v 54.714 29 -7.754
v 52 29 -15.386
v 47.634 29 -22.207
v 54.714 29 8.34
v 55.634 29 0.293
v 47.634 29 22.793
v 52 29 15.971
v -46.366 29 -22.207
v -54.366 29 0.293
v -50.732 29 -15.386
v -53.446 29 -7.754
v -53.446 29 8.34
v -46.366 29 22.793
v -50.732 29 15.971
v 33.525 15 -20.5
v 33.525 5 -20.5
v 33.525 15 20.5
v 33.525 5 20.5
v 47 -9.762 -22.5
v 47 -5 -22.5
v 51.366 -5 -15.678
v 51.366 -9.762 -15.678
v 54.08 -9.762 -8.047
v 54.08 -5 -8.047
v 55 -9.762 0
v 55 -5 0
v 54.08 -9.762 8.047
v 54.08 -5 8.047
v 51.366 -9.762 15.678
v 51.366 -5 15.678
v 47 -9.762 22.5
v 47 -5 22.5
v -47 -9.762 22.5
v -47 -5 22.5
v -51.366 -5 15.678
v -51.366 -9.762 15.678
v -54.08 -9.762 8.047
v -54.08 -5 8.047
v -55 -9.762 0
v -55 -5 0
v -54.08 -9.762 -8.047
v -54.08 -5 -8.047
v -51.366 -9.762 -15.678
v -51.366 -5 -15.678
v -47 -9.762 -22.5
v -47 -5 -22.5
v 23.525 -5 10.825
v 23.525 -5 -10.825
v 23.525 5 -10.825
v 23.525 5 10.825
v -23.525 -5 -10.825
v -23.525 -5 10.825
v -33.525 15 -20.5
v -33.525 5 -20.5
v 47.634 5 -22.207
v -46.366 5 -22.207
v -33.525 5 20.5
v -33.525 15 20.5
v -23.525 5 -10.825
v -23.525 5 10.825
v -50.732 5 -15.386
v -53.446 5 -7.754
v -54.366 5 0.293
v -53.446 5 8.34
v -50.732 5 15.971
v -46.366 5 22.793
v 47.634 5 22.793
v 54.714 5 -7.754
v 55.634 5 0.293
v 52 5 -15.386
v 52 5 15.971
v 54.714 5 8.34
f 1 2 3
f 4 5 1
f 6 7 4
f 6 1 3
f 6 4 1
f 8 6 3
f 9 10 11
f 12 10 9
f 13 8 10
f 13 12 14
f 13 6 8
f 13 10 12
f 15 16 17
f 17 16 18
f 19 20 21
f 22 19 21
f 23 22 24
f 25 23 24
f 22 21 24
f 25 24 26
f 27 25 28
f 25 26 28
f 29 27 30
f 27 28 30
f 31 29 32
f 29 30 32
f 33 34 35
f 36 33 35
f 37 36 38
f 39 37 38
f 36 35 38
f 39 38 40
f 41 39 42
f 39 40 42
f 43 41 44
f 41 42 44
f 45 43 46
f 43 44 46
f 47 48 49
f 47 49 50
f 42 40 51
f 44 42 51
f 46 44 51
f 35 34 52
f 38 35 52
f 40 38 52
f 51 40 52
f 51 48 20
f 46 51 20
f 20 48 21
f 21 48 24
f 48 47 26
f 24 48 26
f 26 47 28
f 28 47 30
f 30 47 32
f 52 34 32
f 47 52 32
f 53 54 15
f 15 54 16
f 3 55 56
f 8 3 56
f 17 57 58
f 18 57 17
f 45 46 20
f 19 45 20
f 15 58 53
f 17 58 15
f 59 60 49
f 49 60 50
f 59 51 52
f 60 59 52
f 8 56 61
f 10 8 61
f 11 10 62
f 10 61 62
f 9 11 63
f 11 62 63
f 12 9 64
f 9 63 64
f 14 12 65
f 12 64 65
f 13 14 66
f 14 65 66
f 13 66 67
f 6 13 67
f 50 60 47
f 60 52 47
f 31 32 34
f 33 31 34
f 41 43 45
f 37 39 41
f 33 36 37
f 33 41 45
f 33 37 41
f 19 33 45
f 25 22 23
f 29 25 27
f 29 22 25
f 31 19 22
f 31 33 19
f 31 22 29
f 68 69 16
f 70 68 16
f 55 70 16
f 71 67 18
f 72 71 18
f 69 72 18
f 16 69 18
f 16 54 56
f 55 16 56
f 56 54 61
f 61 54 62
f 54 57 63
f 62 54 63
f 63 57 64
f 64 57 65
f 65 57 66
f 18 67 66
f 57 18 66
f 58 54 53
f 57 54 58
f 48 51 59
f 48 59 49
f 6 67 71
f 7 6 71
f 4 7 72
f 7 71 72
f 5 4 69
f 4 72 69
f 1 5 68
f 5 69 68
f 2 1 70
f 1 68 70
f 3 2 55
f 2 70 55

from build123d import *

# Parameters (mm, degrees)
F0_W     = 47.05
F0_H     = 21.65
F1_DEPTH = 5
F2_W     = 4.5
F2_H     = 45
F2_W_2   = 85
F3_DEPTH = 4.7625
F4_W     = 4.5
F4_H     = 45
F4_W_2   = 85
F5_DEPTH = 24
F6_W     = 67.05
F6_H     = 41
F7_DEPTH = 10


with BuildPart() as f1:
    # F0 (on Front) → F1 (new body, symmetric)
    with BuildSketch(Plane.XZ):
        Rectangle(F0_W, F0_H)
    extrude(amount=F1_DEPTH, both=True)

    # F2 (on face) → F3 (join)
    with BuildSketch(Plane.XZ.offset(5)):
        with Locations((44.75, 0)):
            Rectangle(F2_W, F2_H)
        with BuildLine():
            ThreePointArc((47, -22.5), (55, 0), (47, 22.5))
            Line((47, 22.5), (47, -22.5))
        make_face()
        Rectangle(F2_W_2, F2_H)
        with Locations((-44.75, 0)):
            Rectangle(F2_W, F2_H)
        with BuildLine():
            Line((-47, -22.5), (-47, 22.5))
            ThreePointArc((-47, 22.5), (-55, 0), (-47, -22.5))
        make_face()
    extrude(amount=F3_DEPTH)


with BuildPart() as f5:
    # F4 (on face) → F5 (new body)
    with BuildSketch(Plane(origin=(0, 5, 0), x_dir=(-1, 0, 0), z_dir=(0, 1, 0))):
        with Locations((44.1160562322, 0.2927509486)):
            Rectangle(F4_W, F4_H)
        with BuildLine():
            Line((46.3660562322, 22.7927509486), (46.3660562322, -22.2072490514))
            ThreePointArc((46.3660562322, -22.2072490514), (54.3660562322, 0.2927509486), (46.3660562322, 22.7927509486))
        make_face()
        with Locations((-0.6339437678, 0.2927509486)):
            Rectangle(F4_W_2, F4_H)
        with Locations((-45.3839437678, 0.2927509486)):
            Rectangle(F4_W, F4_H)
        with BuildLine():
            ThreePointArc((-47.6339437678, 22.7927509486), (-55.6339437678, 0.2927509486), (-47.6339437678, -22.2072490514))
            Line((-47.6339437678, -22.2072490514), (-47.6339437678, 22.7927509486))
        make_face()
    extrude(amount=F5_DEPTH)

    # F6 (on face) → F7 (cut)
    with BuildSketch(Plane.XZ.offset(-5)):
        Rectangle(F6_W, F6_H)
    extrude(amount=-F7_DEPTH, mode=Mode.SUBTRACT)


solid = Compound([f1.part, f5.part])
